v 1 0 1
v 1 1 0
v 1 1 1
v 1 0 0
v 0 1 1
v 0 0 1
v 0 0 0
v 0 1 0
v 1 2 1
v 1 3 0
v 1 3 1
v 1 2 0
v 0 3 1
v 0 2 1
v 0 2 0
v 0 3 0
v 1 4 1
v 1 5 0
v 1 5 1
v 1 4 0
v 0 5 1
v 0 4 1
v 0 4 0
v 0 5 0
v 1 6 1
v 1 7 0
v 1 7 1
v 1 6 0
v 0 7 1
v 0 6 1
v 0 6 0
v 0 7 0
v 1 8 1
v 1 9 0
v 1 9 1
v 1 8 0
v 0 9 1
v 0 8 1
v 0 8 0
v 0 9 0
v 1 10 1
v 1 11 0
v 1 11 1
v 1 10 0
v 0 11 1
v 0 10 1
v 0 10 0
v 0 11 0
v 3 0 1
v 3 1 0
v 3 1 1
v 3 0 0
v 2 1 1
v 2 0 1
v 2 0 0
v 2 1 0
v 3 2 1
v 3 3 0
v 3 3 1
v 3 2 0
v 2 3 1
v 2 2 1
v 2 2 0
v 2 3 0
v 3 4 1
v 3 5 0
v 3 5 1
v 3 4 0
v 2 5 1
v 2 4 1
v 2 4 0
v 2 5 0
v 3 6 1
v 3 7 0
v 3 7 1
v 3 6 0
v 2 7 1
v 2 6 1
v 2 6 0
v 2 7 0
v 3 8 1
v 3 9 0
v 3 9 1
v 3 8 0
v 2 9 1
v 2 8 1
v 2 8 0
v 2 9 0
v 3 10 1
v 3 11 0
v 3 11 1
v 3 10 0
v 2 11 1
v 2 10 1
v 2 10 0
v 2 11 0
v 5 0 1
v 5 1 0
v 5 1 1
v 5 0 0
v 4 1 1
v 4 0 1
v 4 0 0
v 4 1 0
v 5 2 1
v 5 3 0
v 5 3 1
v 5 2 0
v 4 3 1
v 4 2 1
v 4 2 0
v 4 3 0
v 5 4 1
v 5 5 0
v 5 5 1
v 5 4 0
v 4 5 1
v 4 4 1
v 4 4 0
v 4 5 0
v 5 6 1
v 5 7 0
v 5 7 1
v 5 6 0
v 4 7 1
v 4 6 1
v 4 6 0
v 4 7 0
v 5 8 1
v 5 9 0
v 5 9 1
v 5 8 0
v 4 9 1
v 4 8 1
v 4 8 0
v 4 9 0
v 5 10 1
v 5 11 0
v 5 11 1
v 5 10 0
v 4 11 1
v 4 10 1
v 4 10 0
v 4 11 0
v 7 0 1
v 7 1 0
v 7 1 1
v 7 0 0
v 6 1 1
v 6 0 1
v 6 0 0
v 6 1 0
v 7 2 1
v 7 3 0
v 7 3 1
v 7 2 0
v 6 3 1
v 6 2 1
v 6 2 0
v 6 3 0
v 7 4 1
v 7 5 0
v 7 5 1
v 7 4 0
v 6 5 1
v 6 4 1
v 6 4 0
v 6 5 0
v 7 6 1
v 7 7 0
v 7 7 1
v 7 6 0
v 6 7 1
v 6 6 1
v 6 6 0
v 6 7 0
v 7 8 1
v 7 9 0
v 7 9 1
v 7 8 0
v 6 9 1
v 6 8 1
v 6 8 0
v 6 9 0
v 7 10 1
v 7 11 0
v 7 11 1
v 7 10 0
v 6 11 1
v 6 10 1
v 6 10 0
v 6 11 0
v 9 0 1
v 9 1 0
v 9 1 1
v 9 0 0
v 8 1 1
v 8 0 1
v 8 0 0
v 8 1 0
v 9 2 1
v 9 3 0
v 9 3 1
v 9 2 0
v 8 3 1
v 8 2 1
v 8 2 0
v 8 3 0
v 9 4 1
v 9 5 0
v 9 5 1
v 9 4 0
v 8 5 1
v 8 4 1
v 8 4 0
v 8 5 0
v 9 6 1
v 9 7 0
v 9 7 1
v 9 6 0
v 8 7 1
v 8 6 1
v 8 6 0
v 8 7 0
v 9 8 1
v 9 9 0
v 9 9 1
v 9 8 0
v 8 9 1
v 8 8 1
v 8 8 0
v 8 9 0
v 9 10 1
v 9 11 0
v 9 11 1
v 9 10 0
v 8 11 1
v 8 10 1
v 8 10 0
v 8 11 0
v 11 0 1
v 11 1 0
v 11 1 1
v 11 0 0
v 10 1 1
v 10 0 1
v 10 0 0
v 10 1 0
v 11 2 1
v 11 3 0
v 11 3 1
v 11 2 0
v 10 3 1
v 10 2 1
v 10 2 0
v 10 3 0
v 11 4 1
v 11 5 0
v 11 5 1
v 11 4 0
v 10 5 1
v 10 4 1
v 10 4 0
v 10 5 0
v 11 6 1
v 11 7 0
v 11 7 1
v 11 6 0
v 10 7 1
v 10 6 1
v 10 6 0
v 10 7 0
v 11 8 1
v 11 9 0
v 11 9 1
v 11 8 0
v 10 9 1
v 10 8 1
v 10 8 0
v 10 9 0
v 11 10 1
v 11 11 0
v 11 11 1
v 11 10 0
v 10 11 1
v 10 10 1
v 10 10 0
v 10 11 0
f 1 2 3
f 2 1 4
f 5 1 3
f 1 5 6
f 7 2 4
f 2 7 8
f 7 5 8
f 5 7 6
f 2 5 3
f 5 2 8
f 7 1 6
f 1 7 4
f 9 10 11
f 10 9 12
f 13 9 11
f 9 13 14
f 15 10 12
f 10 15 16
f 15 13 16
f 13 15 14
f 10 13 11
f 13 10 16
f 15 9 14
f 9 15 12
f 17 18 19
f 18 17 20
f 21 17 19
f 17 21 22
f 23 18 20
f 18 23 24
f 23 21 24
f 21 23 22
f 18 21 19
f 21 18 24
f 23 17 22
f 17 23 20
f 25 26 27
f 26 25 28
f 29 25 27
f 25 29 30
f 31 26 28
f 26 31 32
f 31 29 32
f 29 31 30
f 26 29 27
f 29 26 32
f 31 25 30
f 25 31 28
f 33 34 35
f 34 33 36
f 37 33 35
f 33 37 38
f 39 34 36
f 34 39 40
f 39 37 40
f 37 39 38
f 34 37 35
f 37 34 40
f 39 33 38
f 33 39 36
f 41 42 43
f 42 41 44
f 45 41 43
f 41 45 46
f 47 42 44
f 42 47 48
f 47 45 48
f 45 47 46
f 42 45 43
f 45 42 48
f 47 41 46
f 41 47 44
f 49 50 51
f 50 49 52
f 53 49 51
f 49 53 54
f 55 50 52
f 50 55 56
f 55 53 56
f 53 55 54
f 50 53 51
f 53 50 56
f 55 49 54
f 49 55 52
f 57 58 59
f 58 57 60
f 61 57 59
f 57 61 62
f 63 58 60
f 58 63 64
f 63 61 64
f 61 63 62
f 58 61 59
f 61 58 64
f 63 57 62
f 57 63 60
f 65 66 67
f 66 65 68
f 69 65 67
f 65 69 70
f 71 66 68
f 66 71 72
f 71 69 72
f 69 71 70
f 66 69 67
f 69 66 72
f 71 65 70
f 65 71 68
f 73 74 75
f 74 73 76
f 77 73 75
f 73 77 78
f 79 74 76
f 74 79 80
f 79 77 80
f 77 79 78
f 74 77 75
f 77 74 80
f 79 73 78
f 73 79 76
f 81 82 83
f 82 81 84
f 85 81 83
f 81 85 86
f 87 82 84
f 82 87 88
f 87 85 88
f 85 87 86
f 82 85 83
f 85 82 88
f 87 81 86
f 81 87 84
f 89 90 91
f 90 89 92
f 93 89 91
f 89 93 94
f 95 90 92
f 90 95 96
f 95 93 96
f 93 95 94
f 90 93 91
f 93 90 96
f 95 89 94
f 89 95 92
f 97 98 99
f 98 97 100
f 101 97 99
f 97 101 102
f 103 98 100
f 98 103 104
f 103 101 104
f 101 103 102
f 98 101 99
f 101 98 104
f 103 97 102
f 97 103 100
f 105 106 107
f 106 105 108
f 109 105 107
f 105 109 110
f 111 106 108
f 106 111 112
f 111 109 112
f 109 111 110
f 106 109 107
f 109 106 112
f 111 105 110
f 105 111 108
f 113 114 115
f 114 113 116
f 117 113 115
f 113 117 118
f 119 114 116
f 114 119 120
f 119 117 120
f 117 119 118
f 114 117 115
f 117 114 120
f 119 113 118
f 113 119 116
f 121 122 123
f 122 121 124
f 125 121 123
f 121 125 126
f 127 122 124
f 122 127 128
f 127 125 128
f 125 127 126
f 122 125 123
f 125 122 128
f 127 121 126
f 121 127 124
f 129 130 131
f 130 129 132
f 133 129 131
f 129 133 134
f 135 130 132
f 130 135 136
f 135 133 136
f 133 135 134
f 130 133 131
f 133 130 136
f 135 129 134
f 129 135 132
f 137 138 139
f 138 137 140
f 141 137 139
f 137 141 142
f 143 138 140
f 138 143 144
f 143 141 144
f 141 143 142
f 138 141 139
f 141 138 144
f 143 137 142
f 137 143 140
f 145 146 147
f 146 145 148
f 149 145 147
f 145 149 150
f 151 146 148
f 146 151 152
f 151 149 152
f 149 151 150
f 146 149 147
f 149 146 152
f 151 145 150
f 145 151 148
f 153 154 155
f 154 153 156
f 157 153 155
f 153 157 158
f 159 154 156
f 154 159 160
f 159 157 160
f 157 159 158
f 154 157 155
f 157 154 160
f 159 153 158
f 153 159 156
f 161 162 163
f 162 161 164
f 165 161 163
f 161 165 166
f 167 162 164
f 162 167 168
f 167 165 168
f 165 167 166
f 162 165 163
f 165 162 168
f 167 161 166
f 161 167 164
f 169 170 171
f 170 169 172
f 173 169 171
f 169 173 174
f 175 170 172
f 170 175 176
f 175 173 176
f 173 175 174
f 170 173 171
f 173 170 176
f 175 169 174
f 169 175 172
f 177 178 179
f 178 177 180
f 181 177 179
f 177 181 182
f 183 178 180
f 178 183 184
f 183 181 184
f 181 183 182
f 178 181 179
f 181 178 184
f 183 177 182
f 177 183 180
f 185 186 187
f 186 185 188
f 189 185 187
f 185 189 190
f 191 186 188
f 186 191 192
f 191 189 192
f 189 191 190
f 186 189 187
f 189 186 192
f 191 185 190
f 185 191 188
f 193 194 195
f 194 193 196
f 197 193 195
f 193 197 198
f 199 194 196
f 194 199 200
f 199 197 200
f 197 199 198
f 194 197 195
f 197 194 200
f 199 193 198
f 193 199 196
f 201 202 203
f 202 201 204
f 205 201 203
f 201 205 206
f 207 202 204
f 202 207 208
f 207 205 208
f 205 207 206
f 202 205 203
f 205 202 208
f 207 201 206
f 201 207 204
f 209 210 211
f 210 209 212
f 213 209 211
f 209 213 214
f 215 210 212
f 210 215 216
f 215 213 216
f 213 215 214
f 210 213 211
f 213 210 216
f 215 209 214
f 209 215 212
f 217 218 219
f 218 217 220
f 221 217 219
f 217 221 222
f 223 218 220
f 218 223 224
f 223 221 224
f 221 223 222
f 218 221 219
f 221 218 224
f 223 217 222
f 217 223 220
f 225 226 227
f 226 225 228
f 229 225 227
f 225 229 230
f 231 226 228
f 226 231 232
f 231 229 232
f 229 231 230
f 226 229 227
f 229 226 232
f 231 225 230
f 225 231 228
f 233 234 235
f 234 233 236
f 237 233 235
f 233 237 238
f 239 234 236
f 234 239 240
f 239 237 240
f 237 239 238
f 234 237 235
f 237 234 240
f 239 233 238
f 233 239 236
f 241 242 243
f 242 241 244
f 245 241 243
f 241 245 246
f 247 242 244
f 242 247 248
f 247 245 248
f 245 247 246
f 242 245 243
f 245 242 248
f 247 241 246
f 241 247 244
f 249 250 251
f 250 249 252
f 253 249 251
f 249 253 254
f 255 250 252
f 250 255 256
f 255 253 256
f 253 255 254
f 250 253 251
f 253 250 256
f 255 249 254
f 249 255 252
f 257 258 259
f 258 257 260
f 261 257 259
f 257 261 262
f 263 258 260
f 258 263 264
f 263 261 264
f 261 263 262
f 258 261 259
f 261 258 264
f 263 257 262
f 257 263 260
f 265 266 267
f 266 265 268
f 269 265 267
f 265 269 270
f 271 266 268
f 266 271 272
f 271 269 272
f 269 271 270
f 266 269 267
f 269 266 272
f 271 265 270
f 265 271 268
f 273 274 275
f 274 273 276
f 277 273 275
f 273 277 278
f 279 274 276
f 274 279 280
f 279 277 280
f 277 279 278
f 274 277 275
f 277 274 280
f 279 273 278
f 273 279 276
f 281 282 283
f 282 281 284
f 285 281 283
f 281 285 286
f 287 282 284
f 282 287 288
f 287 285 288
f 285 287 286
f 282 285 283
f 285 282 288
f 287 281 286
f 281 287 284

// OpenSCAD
// Verify that root modifier works with lazy-union on a ListNode
cube(10);
!for(x=[0:2:10], y=[0:2:10]) translate([x,y]) cube();
sphere(10);
